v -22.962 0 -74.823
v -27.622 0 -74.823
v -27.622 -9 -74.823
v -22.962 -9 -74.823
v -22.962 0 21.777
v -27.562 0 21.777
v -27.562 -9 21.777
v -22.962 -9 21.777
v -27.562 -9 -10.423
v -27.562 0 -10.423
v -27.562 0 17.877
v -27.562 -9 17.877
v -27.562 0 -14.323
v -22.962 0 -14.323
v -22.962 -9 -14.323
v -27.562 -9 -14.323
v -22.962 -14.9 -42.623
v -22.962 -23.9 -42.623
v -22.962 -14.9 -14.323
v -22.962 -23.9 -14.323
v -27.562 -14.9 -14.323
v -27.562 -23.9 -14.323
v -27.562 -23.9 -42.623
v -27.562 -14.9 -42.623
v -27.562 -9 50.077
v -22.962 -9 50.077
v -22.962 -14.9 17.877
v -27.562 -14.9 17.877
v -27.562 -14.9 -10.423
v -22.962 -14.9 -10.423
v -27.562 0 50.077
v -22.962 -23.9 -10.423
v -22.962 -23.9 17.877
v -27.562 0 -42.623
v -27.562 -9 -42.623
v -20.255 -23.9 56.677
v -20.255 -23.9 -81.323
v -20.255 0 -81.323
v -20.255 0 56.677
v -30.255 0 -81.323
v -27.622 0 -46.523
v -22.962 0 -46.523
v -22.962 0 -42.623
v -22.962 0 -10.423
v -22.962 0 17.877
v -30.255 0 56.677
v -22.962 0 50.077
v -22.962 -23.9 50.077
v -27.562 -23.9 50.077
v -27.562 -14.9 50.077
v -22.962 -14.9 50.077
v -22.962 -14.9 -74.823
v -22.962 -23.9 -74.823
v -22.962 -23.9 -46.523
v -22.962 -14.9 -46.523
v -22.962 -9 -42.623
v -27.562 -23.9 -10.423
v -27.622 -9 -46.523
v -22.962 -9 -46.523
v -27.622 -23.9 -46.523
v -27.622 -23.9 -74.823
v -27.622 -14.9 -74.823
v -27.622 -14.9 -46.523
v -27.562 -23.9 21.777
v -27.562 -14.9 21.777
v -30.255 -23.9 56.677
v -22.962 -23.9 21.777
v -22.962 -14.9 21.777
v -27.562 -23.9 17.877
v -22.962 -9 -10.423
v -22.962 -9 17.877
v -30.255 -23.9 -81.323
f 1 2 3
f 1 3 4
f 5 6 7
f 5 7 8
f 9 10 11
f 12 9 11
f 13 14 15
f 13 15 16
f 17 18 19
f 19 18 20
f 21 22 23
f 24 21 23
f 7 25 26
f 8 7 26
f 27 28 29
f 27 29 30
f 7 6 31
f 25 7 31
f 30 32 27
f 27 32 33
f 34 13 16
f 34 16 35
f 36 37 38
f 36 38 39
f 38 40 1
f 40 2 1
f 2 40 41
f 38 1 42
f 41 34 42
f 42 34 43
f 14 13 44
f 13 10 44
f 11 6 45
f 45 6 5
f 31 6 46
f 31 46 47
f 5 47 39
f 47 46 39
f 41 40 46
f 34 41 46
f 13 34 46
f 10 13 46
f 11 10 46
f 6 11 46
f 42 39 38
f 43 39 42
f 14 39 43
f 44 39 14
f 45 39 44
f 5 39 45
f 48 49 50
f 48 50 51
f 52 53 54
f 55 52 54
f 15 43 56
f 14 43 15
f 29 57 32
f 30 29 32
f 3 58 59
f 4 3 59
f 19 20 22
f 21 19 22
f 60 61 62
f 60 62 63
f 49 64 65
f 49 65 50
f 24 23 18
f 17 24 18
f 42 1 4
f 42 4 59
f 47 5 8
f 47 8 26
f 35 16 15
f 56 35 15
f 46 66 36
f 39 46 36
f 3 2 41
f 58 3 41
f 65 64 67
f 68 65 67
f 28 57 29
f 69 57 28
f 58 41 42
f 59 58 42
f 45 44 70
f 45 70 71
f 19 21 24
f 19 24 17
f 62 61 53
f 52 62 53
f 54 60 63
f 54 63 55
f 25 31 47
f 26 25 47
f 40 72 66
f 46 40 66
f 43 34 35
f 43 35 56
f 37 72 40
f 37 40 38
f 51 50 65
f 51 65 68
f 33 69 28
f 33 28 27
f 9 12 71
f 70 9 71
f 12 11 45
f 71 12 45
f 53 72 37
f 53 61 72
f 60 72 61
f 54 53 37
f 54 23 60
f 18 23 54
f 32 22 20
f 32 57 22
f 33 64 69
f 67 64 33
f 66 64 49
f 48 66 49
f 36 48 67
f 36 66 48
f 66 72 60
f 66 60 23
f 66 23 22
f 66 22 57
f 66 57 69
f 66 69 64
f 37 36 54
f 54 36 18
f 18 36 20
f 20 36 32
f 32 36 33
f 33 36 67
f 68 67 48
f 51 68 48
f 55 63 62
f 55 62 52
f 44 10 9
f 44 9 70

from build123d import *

# Parameters (mm, degrees)
F0_W     = 10
F0_H     = 138
F0_W_2   = 4.659399
F0_H_2   = 28.3
F0_W_3   = 4.6
F1_DEPTH = 11.95
F2_DEPTH = 9


with BuildPart() as f1:
    # F0 (on Front) → F1 (new body)
    with BuildSketch(Plane.XZ):
        with Locations((-25.254509, -12.323071)):
            Rectangle(F0_W, F0_H)
        with Locations((-25.291808, -60.673071)):
            Rectangle(F0_W_2, F0_H_2, mode=Mode.SUBTRACT)
        Polygon((-27.562109, -41.183438), (-27.562109, -14.323071), (-22.962109, -14.323071), (-22.962109, -42.623071), (-27.562109, -42.623071), align=None, mode=Mode.SUBTRACT)
        with Locations((-25.262109, 3.726929)):
            Rectangle(F0_W_3, F0_H_2, mode=Mode.SUBTRACT)
        with Locations((-25.262109, 35.926929)):
            Rectangle(F0_W_3, F0_H_2, mode=Mode.SUBTRACT)
        with Locations((-25.262109, 35.926929)):
            Rectangle(F0_W_3, F0_H_2)
        with Locations((-25.262109, 3.726929)):
            Rectangle(F0_W_3, F0_H_2)
        Polygon((-22.962109, -14.323071), (-27.562109, -14.323071), (-27.562109, -41.183438), (-27.562109, -42.623071), (-22.962109, -42.623071), align=None)
        with Locations((-25.291808, -60.673071)):
            Rectangle(F0_W_2, F0_H_2)
    extrude(amount=F1_DEPTH)

    # F0 (on Front) → F2 (cut)
    with BuildSketch(Plane.XZ):
        with Locations((-25.262109, 35.926929)):
            Rectangle(F0_W_3, F0_H_2)
        with Locations((-25.262109, 3.726929)):
            Rectangle(F0_W_3, F0_H_2)
        Polygon((-22.962109, -14.323071), (-27.562109, -14.323071), (-27.562109, -41.183438), (-27.562109, -42.623071), (-22.962109, -42.623071), align=None)
        with Locations((-25.291808, -60.673071)):
            Rectangle(F0_W_2, F0_H_2)
    extrude(amount=F2_DEPTH, mode=Mode.SUBTRACT)

    # F3: F1 across face


with BuildPart() as f1_1:
    add(f1.part)
    add(f1.part.mirror(Plane(origin=(-25.254509, -11.95, -12.323071), x_dir=(1, 0, 0), z_dir=(0, -1, 0))))


solid = f1_1.part
